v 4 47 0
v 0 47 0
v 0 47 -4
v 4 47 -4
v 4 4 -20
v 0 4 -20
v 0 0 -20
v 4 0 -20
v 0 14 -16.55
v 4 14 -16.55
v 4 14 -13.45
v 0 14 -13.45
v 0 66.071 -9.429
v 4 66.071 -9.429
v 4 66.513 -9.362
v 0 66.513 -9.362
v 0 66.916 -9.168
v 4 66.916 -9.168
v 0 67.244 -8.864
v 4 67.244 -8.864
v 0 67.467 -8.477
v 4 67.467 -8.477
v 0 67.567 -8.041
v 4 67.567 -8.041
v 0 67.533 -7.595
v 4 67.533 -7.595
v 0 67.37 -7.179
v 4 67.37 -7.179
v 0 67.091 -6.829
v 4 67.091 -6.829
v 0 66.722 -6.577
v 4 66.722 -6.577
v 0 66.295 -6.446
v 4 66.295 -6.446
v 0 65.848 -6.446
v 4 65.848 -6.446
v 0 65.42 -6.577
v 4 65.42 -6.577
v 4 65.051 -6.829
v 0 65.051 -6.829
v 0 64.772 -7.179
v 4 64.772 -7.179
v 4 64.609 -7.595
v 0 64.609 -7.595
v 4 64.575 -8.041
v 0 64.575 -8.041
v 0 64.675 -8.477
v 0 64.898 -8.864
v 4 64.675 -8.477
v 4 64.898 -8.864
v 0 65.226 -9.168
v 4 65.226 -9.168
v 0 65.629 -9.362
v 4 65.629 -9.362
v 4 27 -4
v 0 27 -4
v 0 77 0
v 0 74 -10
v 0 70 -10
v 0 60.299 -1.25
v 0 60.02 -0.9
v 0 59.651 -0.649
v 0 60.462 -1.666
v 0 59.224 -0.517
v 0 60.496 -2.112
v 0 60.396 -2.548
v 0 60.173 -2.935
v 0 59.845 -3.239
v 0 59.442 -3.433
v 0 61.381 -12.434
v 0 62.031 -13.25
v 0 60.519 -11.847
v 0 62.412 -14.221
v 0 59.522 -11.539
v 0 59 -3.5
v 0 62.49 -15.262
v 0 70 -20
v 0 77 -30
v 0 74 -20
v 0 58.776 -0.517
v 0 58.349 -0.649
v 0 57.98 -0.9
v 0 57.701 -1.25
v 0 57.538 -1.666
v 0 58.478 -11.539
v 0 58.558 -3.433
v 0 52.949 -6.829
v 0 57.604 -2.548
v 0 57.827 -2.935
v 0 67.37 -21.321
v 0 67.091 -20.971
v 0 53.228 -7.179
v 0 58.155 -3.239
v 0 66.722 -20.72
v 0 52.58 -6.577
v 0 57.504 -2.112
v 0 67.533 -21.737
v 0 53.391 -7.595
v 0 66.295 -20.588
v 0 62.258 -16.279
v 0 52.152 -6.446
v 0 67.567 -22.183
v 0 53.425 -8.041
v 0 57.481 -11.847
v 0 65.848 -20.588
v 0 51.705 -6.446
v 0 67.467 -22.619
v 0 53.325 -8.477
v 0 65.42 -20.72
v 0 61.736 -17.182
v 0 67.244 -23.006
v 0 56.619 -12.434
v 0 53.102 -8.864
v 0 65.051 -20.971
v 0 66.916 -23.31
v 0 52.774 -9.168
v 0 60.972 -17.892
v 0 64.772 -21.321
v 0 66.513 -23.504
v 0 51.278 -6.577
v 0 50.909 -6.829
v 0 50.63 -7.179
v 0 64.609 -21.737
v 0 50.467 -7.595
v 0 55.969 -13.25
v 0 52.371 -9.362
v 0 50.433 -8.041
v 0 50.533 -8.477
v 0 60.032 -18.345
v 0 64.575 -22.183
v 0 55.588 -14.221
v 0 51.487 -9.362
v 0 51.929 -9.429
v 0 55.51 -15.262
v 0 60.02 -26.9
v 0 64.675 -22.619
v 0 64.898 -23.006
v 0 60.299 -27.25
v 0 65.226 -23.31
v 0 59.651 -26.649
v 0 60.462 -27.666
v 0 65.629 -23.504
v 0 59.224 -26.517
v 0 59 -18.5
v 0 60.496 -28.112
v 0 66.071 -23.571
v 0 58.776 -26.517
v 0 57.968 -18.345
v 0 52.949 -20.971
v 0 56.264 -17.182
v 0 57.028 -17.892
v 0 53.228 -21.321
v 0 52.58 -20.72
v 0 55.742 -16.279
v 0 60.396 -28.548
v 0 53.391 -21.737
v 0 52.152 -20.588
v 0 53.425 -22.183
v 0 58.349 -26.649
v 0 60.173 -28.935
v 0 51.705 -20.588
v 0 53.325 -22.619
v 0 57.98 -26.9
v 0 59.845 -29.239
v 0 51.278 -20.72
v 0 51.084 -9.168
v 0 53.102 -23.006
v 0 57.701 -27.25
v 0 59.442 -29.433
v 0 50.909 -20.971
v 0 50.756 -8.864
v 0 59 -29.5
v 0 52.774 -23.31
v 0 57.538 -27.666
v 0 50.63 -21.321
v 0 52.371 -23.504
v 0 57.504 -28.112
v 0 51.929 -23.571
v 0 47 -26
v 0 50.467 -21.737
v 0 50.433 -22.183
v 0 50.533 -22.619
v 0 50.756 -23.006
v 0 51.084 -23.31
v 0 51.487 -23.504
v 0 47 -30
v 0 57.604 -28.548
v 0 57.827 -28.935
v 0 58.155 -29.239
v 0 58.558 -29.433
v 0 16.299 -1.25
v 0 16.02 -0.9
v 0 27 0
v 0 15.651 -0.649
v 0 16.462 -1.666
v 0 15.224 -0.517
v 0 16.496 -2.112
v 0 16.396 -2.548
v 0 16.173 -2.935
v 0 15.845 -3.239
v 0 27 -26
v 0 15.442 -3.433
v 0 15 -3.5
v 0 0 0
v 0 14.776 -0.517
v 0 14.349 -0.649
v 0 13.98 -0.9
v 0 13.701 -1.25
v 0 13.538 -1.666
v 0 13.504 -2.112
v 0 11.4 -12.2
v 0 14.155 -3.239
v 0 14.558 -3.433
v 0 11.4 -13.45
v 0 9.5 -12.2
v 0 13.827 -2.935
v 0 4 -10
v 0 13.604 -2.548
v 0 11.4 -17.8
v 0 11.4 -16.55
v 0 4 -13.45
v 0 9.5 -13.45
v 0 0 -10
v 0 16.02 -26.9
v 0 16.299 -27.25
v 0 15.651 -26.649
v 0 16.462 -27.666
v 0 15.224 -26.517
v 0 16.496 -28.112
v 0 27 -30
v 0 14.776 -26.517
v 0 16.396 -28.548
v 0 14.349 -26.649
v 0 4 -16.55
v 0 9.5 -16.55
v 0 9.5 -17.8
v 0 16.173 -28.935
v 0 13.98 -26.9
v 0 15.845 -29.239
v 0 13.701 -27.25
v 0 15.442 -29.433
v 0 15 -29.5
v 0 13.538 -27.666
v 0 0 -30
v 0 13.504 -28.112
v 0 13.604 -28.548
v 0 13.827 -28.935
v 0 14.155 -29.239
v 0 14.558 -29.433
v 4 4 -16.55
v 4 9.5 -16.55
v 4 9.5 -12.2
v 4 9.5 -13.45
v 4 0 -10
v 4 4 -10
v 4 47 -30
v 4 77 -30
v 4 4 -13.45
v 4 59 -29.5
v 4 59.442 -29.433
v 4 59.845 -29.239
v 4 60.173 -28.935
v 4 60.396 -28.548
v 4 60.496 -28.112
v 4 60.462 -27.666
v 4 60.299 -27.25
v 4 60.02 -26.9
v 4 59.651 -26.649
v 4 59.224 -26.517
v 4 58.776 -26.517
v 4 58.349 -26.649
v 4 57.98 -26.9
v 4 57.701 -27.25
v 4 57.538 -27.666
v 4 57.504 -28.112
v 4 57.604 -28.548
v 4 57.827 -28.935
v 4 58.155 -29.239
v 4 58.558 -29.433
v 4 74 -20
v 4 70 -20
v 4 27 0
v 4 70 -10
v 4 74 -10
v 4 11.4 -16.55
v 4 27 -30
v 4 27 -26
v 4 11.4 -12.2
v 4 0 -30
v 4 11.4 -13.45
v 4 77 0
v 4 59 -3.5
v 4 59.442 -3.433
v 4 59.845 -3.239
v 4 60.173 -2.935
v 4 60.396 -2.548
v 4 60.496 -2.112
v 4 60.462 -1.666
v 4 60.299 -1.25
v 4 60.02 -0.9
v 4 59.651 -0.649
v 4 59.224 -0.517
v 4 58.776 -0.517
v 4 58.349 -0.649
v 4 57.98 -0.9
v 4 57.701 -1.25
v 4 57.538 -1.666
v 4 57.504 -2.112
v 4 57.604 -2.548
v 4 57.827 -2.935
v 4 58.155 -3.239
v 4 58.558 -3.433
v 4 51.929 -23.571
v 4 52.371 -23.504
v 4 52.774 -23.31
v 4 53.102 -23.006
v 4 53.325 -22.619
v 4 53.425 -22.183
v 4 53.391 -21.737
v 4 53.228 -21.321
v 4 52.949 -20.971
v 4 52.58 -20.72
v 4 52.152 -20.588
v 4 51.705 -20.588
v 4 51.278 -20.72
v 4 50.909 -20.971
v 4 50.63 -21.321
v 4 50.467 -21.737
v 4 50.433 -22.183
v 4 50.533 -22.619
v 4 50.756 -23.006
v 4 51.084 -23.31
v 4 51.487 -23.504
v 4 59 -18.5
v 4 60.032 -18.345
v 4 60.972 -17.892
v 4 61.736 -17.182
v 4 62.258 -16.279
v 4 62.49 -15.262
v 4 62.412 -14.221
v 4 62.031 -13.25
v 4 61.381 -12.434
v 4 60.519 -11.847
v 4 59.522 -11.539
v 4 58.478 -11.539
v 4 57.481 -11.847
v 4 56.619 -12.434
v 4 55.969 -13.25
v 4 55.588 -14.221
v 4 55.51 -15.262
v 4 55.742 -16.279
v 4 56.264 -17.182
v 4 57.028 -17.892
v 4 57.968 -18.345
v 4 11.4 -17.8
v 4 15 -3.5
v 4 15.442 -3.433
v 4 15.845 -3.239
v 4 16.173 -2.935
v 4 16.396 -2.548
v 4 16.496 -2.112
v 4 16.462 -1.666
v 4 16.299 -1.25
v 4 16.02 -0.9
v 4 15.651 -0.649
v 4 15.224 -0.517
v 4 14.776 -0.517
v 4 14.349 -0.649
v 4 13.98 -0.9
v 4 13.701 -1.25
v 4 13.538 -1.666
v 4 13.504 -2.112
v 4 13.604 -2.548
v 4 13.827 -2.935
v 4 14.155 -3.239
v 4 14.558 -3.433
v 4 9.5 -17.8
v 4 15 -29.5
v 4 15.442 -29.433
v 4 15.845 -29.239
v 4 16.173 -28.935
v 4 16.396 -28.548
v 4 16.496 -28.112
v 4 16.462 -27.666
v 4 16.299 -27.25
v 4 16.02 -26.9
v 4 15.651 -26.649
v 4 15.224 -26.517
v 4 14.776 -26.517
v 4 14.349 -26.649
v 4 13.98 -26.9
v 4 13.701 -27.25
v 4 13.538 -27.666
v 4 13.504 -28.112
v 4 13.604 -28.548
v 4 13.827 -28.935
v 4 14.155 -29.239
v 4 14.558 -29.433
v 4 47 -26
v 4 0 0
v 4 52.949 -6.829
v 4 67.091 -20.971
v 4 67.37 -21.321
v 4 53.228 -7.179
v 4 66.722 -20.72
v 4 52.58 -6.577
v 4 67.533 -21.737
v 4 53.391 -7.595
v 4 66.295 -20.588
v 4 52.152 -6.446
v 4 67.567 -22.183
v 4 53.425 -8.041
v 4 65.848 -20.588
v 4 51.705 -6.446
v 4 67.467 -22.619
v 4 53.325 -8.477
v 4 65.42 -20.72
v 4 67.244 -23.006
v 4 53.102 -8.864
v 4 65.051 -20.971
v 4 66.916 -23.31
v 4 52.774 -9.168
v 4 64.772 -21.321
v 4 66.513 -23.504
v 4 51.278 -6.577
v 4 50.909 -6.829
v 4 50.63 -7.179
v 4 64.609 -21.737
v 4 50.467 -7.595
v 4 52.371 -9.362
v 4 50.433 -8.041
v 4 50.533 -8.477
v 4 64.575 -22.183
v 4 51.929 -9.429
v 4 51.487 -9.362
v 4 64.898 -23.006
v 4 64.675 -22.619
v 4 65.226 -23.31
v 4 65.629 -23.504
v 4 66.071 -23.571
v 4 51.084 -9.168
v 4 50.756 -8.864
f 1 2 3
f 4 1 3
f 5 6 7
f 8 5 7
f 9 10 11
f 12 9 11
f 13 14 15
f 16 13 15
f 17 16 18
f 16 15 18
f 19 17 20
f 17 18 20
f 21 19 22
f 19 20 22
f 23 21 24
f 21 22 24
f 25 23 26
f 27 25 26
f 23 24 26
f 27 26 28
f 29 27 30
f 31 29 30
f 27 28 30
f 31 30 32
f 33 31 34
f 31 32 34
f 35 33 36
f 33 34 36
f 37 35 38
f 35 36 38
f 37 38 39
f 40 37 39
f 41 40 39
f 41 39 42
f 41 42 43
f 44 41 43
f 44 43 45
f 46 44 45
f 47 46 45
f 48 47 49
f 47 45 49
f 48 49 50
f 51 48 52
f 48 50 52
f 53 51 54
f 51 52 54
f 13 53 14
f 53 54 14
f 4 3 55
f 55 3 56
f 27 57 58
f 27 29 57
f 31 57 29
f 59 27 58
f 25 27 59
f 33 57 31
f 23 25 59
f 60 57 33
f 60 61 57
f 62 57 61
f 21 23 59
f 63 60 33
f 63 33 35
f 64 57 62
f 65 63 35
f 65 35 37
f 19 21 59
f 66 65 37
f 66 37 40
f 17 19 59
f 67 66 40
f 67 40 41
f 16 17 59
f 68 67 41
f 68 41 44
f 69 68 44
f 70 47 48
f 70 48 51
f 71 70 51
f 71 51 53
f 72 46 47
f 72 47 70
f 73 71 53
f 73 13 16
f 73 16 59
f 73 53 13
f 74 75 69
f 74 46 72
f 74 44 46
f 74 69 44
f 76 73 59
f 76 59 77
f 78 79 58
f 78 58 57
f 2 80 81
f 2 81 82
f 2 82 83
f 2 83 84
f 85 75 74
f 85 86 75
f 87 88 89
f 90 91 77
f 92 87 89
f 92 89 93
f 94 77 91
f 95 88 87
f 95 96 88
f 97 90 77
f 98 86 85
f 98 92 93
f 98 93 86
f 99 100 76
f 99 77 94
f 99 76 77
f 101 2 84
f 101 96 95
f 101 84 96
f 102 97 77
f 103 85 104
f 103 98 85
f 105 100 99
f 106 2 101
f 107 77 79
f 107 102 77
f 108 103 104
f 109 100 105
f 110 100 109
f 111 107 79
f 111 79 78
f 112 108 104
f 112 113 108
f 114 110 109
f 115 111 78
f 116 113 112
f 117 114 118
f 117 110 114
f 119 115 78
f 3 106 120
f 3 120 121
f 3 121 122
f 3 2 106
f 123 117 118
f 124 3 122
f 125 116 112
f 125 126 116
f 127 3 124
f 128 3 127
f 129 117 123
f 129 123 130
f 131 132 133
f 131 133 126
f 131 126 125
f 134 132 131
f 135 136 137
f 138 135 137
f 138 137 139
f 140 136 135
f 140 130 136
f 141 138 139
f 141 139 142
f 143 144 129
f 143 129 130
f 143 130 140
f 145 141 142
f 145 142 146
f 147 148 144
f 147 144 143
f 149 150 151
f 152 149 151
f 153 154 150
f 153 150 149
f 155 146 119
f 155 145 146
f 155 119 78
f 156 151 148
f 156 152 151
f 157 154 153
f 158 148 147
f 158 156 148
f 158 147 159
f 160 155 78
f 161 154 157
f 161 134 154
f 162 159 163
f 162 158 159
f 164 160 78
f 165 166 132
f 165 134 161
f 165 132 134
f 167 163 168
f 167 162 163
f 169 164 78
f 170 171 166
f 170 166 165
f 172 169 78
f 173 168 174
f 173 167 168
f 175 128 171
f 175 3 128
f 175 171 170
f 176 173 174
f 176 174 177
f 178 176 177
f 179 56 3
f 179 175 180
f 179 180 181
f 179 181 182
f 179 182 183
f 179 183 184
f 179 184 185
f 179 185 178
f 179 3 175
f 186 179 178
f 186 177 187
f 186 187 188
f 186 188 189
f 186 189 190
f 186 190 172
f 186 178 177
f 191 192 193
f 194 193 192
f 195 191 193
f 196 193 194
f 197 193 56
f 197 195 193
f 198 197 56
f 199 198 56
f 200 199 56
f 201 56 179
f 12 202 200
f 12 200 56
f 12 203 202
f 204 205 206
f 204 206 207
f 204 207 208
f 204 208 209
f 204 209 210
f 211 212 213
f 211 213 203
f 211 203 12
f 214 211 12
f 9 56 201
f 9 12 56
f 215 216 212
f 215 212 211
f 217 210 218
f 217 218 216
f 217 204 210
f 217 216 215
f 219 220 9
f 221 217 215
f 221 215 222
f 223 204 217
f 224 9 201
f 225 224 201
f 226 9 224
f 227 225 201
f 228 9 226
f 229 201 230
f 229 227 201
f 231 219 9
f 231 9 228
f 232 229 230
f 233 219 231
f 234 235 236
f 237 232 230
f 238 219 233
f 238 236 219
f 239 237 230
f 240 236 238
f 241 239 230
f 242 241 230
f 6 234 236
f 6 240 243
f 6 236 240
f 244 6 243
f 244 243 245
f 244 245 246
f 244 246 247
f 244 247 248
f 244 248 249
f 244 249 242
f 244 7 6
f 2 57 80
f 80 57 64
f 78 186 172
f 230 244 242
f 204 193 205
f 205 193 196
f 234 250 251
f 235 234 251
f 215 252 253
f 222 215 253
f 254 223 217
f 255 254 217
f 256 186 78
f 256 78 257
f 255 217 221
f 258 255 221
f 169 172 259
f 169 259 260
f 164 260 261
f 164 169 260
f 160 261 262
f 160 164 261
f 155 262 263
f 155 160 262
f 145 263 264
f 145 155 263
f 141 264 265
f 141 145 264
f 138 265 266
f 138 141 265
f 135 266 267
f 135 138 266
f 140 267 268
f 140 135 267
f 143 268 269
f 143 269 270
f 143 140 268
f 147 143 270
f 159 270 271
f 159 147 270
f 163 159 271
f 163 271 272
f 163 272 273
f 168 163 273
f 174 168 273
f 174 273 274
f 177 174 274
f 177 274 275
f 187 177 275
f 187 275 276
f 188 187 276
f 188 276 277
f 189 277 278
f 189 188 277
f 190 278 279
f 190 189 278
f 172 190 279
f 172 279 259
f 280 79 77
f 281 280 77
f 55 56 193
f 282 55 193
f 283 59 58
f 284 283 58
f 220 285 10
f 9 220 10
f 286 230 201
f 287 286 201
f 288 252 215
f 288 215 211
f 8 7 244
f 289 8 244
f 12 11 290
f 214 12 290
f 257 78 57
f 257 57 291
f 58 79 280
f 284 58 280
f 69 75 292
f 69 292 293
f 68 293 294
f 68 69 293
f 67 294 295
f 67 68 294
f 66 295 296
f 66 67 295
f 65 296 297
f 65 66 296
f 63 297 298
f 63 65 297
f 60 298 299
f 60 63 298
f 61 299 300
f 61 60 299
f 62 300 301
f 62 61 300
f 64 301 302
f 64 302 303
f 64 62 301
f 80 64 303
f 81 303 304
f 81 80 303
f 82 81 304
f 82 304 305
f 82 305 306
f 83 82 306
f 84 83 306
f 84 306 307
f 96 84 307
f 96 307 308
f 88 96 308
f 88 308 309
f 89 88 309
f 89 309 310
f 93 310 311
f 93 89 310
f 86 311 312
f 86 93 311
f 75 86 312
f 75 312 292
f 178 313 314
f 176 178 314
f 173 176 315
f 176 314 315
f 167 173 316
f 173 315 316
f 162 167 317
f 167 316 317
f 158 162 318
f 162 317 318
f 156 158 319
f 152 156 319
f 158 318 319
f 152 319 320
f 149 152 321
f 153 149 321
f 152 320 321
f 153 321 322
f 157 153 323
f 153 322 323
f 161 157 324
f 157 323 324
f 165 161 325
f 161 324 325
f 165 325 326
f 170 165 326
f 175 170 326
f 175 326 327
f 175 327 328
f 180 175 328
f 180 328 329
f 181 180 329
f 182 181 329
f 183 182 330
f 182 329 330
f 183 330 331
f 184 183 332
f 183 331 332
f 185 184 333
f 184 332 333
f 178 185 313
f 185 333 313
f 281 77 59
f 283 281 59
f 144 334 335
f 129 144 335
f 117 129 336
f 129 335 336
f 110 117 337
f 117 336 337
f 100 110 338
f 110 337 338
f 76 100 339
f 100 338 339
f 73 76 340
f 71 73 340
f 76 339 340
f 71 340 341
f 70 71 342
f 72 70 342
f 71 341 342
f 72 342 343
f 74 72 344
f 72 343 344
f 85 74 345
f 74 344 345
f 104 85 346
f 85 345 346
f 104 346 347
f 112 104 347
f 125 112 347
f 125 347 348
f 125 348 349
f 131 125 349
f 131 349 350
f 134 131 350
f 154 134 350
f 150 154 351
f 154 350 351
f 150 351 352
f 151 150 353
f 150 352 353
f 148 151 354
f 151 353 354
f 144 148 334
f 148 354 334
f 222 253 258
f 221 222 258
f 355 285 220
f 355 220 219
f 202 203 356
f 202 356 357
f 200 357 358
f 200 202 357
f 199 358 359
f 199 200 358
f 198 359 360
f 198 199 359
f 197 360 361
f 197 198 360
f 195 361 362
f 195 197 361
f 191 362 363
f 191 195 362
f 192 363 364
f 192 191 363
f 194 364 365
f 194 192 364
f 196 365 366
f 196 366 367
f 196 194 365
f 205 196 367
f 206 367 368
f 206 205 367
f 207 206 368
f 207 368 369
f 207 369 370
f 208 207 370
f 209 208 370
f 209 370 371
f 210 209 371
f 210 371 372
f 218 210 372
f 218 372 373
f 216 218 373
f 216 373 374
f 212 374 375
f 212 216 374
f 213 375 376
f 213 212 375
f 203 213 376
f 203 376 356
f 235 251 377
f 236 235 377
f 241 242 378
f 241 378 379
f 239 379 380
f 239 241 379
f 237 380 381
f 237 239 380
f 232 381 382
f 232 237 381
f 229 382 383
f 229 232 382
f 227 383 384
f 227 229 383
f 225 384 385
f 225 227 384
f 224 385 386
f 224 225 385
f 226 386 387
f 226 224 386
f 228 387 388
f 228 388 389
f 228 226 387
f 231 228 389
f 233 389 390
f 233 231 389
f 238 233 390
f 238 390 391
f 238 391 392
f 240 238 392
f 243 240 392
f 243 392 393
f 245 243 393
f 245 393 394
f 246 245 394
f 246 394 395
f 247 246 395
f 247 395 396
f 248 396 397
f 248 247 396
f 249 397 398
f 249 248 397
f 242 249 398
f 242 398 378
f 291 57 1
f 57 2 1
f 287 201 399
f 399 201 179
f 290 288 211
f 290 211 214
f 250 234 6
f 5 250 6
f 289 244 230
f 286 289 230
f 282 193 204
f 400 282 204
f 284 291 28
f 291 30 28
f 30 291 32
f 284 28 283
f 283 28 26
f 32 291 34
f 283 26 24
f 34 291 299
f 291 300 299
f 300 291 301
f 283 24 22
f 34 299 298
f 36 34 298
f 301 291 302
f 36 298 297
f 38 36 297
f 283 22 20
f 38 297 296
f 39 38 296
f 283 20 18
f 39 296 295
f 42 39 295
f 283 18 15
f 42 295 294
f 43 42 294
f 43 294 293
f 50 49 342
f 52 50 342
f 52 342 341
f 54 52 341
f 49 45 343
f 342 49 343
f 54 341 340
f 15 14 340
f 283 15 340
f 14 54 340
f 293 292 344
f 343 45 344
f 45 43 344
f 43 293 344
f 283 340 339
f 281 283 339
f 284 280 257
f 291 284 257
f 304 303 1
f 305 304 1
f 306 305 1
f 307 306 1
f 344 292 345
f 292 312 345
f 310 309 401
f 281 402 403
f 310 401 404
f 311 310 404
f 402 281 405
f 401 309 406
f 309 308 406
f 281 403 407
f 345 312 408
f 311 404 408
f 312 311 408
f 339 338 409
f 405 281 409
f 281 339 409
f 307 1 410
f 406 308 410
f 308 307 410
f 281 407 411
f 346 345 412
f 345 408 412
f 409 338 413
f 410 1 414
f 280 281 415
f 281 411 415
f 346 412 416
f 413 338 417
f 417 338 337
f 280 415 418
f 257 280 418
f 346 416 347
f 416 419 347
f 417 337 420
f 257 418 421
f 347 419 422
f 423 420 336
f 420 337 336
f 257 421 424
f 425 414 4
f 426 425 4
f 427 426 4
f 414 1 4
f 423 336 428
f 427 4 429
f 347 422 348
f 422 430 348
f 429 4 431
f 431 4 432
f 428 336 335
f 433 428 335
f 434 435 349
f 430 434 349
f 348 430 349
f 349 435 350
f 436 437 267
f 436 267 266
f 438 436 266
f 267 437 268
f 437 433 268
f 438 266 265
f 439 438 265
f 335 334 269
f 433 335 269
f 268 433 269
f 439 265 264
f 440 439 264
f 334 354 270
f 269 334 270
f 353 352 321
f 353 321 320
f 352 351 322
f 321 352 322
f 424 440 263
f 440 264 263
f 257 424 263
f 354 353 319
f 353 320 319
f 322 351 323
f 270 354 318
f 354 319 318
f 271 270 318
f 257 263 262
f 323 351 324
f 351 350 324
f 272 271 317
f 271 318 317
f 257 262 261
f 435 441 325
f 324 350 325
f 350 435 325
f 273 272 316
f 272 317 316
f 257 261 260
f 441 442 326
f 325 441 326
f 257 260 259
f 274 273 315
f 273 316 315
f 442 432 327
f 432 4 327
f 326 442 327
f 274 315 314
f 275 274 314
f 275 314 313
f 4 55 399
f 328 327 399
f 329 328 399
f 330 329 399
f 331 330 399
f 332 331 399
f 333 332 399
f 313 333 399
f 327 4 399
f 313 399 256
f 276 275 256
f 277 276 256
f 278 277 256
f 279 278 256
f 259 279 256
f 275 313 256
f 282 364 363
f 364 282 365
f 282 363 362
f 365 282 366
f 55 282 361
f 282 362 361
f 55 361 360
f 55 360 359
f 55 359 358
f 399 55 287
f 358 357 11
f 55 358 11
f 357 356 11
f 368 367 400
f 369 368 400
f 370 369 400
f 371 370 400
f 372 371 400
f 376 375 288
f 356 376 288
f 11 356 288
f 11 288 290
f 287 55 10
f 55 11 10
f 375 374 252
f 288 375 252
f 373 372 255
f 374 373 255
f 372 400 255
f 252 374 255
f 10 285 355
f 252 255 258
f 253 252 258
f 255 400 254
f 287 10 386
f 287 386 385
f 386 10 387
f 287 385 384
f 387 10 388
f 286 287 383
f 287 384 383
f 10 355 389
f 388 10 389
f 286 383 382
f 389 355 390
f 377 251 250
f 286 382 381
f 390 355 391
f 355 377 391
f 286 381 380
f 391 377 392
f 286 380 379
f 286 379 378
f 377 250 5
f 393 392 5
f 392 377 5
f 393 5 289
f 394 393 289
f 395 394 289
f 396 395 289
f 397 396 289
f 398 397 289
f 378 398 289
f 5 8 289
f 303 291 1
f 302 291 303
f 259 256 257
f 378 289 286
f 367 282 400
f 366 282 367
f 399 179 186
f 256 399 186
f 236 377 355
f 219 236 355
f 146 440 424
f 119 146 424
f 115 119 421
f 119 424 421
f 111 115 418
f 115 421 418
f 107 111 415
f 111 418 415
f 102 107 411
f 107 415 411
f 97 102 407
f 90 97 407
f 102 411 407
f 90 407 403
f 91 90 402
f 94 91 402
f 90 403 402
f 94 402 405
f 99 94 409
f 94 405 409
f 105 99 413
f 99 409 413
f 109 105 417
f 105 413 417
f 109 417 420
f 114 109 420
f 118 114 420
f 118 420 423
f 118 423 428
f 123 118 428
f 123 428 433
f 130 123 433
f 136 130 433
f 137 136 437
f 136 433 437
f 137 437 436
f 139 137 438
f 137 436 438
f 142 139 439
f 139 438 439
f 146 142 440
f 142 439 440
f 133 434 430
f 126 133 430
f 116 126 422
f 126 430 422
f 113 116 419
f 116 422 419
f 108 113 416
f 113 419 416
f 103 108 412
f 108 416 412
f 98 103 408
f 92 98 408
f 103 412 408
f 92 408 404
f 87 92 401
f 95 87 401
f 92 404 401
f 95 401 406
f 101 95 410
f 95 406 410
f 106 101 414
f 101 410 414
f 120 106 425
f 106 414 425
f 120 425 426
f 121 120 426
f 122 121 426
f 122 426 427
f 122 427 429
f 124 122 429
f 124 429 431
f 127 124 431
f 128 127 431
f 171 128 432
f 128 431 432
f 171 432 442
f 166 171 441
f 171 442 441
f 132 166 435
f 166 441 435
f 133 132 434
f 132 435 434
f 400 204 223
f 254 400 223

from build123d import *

# Parameters (mm, degrees)
SKETCH1_R           = 1.5
BOSS_EXTRUDE1_DEPTH = 4
SKETCH2_R           = 3.5
SKETCH2_R_2         = 1.5
CUT_EXTRUDE1_DEPTH  = 4
SKETCH3_W           = 4
SKETCH3_H           = 30
BOSS_EXTRUDE2_DEPTH = 3
SKETCH5_W           = 1.55
SKETCH5_H           = 2.6
SKETCH5_H_2         = 1.9
SKETCH5_H_3         = 5.5
SKETCH5_W_2         = 1.25
CUT_EXTRUDE2_DEPTH  = 10


with BuildPart() as part:
    # Sketch1 → Boss-Extrude1 (new body)
    with BuildSketch(Plane(origin=(0, 0, 0), x_dir=(0, 0, -1), z_dir=(1, 0, 0))):
        Polygon((30, 74), (20, 74), (20, 70), (10, 70), (10, 74), (0, 74), (0, 47), (4, 47), (4, 27), (0, 27), (0, 0), (10, 0), (10, 4), (20, 4), (20, 0), (30, 0), (30, 27), (26, 27), (26, 47), (30, 47), align=None)
        with Locations((2, 15)):
            Circle(SKETCH1_R, mode=Mode.SUBTRACT)
        with Locations((28, 15)):
            Circle(SKETCH1_R, mode=Mode.SUBTRACT)
        with Locations((2, 59)):
            Circle(SKETCH1_R, mode=Mode.SUBTRACT)
        with Locations((28, 59)):
            Circle(SKETCH1_R, mode=Mode.SUBTRACT)
    extrude(amount=BOSS_EXTRUDE1_DEPTH)

    # Sketch2 → Cut-Extrude1 (cut)
    with BuildSketch(Plane(origin=(4, 0, 0), x_dir=(0, 0, -1), z_dir=(1, 0, 0))):
        with Locations((15, 59)):
            Circle(SKETCH2_R)
        with Locations((7.928932188, 66.071067812)):
            Circle(SKETCH2_R_2)
        with Locations((22.071067812, 66.071067812)):
            Circle(SKETCH2_R_2)
        with Locations((22.071067812, 51.928932188)):
            Circle(SKETCH2_R_2)
        with Locations((7.928932188, 51.928932188)):
            Circle(SKETCH2_R_2)
    extrude(amount=-CUT_EXTRUDE1_DEPTH, mode=Mode.SUBTRACT)

    # Sketch3 → Boss-Extrude2 (add)
    with BuildSketch(Plane(origin=(0, 74, 0), x_dir=(1, 0, 0), z_dir=(0, 1, 0))):
        with Locations((2, 15)):
            Rectangle(SKETCH3_W, SKETCH3_H)
    extrude(amount=BOSS_EXTRUDE2_DEPTH)

    # Sketch5 → Cut-Extrude2 (cut)
    with BuildSketch(Plane(origin=(4, 0, 0), x_dir=(0, 0, -1), z_dir=(1, 0, 0))):
        with Locations((14.225, 12.7)):
            Rectangle(SKETCH5_W, SKETCH5_H)
        with Locations((14.225, 10.45)):
            Rectangle(SKETCH5_W, SKETCH5_H_2)
        with Locations((14.225, 6.75)):
            Rectangle(SKETCH5_W, SKETCH5_H_3)
        with Locations((15.775, 12.7)):
            Rectangle(SKETCH5_W, SKETCH5_H)
        with Locations((15.775, 10.45)):
            Rectangle(SKETCH5_W, SKETCH5_H_2)
        with Locations((15.775, 6.75)):
            Rectangle(SKETCH5_W, SKETCH5_H_3)
        with Locations((17.175, 10.45)):
            Rectangle(SKETCH5_W_2, SKETCH5_H_2)
        with Locations((12.825, 10.45)):
            Rectangle(SKETCH5_W_2, SKETCH5_H_2)
    extrude(amount=-CUT_EXTRUDE2_DEPTH, mode=Mode.SUBTRACT)


solid = part.part
